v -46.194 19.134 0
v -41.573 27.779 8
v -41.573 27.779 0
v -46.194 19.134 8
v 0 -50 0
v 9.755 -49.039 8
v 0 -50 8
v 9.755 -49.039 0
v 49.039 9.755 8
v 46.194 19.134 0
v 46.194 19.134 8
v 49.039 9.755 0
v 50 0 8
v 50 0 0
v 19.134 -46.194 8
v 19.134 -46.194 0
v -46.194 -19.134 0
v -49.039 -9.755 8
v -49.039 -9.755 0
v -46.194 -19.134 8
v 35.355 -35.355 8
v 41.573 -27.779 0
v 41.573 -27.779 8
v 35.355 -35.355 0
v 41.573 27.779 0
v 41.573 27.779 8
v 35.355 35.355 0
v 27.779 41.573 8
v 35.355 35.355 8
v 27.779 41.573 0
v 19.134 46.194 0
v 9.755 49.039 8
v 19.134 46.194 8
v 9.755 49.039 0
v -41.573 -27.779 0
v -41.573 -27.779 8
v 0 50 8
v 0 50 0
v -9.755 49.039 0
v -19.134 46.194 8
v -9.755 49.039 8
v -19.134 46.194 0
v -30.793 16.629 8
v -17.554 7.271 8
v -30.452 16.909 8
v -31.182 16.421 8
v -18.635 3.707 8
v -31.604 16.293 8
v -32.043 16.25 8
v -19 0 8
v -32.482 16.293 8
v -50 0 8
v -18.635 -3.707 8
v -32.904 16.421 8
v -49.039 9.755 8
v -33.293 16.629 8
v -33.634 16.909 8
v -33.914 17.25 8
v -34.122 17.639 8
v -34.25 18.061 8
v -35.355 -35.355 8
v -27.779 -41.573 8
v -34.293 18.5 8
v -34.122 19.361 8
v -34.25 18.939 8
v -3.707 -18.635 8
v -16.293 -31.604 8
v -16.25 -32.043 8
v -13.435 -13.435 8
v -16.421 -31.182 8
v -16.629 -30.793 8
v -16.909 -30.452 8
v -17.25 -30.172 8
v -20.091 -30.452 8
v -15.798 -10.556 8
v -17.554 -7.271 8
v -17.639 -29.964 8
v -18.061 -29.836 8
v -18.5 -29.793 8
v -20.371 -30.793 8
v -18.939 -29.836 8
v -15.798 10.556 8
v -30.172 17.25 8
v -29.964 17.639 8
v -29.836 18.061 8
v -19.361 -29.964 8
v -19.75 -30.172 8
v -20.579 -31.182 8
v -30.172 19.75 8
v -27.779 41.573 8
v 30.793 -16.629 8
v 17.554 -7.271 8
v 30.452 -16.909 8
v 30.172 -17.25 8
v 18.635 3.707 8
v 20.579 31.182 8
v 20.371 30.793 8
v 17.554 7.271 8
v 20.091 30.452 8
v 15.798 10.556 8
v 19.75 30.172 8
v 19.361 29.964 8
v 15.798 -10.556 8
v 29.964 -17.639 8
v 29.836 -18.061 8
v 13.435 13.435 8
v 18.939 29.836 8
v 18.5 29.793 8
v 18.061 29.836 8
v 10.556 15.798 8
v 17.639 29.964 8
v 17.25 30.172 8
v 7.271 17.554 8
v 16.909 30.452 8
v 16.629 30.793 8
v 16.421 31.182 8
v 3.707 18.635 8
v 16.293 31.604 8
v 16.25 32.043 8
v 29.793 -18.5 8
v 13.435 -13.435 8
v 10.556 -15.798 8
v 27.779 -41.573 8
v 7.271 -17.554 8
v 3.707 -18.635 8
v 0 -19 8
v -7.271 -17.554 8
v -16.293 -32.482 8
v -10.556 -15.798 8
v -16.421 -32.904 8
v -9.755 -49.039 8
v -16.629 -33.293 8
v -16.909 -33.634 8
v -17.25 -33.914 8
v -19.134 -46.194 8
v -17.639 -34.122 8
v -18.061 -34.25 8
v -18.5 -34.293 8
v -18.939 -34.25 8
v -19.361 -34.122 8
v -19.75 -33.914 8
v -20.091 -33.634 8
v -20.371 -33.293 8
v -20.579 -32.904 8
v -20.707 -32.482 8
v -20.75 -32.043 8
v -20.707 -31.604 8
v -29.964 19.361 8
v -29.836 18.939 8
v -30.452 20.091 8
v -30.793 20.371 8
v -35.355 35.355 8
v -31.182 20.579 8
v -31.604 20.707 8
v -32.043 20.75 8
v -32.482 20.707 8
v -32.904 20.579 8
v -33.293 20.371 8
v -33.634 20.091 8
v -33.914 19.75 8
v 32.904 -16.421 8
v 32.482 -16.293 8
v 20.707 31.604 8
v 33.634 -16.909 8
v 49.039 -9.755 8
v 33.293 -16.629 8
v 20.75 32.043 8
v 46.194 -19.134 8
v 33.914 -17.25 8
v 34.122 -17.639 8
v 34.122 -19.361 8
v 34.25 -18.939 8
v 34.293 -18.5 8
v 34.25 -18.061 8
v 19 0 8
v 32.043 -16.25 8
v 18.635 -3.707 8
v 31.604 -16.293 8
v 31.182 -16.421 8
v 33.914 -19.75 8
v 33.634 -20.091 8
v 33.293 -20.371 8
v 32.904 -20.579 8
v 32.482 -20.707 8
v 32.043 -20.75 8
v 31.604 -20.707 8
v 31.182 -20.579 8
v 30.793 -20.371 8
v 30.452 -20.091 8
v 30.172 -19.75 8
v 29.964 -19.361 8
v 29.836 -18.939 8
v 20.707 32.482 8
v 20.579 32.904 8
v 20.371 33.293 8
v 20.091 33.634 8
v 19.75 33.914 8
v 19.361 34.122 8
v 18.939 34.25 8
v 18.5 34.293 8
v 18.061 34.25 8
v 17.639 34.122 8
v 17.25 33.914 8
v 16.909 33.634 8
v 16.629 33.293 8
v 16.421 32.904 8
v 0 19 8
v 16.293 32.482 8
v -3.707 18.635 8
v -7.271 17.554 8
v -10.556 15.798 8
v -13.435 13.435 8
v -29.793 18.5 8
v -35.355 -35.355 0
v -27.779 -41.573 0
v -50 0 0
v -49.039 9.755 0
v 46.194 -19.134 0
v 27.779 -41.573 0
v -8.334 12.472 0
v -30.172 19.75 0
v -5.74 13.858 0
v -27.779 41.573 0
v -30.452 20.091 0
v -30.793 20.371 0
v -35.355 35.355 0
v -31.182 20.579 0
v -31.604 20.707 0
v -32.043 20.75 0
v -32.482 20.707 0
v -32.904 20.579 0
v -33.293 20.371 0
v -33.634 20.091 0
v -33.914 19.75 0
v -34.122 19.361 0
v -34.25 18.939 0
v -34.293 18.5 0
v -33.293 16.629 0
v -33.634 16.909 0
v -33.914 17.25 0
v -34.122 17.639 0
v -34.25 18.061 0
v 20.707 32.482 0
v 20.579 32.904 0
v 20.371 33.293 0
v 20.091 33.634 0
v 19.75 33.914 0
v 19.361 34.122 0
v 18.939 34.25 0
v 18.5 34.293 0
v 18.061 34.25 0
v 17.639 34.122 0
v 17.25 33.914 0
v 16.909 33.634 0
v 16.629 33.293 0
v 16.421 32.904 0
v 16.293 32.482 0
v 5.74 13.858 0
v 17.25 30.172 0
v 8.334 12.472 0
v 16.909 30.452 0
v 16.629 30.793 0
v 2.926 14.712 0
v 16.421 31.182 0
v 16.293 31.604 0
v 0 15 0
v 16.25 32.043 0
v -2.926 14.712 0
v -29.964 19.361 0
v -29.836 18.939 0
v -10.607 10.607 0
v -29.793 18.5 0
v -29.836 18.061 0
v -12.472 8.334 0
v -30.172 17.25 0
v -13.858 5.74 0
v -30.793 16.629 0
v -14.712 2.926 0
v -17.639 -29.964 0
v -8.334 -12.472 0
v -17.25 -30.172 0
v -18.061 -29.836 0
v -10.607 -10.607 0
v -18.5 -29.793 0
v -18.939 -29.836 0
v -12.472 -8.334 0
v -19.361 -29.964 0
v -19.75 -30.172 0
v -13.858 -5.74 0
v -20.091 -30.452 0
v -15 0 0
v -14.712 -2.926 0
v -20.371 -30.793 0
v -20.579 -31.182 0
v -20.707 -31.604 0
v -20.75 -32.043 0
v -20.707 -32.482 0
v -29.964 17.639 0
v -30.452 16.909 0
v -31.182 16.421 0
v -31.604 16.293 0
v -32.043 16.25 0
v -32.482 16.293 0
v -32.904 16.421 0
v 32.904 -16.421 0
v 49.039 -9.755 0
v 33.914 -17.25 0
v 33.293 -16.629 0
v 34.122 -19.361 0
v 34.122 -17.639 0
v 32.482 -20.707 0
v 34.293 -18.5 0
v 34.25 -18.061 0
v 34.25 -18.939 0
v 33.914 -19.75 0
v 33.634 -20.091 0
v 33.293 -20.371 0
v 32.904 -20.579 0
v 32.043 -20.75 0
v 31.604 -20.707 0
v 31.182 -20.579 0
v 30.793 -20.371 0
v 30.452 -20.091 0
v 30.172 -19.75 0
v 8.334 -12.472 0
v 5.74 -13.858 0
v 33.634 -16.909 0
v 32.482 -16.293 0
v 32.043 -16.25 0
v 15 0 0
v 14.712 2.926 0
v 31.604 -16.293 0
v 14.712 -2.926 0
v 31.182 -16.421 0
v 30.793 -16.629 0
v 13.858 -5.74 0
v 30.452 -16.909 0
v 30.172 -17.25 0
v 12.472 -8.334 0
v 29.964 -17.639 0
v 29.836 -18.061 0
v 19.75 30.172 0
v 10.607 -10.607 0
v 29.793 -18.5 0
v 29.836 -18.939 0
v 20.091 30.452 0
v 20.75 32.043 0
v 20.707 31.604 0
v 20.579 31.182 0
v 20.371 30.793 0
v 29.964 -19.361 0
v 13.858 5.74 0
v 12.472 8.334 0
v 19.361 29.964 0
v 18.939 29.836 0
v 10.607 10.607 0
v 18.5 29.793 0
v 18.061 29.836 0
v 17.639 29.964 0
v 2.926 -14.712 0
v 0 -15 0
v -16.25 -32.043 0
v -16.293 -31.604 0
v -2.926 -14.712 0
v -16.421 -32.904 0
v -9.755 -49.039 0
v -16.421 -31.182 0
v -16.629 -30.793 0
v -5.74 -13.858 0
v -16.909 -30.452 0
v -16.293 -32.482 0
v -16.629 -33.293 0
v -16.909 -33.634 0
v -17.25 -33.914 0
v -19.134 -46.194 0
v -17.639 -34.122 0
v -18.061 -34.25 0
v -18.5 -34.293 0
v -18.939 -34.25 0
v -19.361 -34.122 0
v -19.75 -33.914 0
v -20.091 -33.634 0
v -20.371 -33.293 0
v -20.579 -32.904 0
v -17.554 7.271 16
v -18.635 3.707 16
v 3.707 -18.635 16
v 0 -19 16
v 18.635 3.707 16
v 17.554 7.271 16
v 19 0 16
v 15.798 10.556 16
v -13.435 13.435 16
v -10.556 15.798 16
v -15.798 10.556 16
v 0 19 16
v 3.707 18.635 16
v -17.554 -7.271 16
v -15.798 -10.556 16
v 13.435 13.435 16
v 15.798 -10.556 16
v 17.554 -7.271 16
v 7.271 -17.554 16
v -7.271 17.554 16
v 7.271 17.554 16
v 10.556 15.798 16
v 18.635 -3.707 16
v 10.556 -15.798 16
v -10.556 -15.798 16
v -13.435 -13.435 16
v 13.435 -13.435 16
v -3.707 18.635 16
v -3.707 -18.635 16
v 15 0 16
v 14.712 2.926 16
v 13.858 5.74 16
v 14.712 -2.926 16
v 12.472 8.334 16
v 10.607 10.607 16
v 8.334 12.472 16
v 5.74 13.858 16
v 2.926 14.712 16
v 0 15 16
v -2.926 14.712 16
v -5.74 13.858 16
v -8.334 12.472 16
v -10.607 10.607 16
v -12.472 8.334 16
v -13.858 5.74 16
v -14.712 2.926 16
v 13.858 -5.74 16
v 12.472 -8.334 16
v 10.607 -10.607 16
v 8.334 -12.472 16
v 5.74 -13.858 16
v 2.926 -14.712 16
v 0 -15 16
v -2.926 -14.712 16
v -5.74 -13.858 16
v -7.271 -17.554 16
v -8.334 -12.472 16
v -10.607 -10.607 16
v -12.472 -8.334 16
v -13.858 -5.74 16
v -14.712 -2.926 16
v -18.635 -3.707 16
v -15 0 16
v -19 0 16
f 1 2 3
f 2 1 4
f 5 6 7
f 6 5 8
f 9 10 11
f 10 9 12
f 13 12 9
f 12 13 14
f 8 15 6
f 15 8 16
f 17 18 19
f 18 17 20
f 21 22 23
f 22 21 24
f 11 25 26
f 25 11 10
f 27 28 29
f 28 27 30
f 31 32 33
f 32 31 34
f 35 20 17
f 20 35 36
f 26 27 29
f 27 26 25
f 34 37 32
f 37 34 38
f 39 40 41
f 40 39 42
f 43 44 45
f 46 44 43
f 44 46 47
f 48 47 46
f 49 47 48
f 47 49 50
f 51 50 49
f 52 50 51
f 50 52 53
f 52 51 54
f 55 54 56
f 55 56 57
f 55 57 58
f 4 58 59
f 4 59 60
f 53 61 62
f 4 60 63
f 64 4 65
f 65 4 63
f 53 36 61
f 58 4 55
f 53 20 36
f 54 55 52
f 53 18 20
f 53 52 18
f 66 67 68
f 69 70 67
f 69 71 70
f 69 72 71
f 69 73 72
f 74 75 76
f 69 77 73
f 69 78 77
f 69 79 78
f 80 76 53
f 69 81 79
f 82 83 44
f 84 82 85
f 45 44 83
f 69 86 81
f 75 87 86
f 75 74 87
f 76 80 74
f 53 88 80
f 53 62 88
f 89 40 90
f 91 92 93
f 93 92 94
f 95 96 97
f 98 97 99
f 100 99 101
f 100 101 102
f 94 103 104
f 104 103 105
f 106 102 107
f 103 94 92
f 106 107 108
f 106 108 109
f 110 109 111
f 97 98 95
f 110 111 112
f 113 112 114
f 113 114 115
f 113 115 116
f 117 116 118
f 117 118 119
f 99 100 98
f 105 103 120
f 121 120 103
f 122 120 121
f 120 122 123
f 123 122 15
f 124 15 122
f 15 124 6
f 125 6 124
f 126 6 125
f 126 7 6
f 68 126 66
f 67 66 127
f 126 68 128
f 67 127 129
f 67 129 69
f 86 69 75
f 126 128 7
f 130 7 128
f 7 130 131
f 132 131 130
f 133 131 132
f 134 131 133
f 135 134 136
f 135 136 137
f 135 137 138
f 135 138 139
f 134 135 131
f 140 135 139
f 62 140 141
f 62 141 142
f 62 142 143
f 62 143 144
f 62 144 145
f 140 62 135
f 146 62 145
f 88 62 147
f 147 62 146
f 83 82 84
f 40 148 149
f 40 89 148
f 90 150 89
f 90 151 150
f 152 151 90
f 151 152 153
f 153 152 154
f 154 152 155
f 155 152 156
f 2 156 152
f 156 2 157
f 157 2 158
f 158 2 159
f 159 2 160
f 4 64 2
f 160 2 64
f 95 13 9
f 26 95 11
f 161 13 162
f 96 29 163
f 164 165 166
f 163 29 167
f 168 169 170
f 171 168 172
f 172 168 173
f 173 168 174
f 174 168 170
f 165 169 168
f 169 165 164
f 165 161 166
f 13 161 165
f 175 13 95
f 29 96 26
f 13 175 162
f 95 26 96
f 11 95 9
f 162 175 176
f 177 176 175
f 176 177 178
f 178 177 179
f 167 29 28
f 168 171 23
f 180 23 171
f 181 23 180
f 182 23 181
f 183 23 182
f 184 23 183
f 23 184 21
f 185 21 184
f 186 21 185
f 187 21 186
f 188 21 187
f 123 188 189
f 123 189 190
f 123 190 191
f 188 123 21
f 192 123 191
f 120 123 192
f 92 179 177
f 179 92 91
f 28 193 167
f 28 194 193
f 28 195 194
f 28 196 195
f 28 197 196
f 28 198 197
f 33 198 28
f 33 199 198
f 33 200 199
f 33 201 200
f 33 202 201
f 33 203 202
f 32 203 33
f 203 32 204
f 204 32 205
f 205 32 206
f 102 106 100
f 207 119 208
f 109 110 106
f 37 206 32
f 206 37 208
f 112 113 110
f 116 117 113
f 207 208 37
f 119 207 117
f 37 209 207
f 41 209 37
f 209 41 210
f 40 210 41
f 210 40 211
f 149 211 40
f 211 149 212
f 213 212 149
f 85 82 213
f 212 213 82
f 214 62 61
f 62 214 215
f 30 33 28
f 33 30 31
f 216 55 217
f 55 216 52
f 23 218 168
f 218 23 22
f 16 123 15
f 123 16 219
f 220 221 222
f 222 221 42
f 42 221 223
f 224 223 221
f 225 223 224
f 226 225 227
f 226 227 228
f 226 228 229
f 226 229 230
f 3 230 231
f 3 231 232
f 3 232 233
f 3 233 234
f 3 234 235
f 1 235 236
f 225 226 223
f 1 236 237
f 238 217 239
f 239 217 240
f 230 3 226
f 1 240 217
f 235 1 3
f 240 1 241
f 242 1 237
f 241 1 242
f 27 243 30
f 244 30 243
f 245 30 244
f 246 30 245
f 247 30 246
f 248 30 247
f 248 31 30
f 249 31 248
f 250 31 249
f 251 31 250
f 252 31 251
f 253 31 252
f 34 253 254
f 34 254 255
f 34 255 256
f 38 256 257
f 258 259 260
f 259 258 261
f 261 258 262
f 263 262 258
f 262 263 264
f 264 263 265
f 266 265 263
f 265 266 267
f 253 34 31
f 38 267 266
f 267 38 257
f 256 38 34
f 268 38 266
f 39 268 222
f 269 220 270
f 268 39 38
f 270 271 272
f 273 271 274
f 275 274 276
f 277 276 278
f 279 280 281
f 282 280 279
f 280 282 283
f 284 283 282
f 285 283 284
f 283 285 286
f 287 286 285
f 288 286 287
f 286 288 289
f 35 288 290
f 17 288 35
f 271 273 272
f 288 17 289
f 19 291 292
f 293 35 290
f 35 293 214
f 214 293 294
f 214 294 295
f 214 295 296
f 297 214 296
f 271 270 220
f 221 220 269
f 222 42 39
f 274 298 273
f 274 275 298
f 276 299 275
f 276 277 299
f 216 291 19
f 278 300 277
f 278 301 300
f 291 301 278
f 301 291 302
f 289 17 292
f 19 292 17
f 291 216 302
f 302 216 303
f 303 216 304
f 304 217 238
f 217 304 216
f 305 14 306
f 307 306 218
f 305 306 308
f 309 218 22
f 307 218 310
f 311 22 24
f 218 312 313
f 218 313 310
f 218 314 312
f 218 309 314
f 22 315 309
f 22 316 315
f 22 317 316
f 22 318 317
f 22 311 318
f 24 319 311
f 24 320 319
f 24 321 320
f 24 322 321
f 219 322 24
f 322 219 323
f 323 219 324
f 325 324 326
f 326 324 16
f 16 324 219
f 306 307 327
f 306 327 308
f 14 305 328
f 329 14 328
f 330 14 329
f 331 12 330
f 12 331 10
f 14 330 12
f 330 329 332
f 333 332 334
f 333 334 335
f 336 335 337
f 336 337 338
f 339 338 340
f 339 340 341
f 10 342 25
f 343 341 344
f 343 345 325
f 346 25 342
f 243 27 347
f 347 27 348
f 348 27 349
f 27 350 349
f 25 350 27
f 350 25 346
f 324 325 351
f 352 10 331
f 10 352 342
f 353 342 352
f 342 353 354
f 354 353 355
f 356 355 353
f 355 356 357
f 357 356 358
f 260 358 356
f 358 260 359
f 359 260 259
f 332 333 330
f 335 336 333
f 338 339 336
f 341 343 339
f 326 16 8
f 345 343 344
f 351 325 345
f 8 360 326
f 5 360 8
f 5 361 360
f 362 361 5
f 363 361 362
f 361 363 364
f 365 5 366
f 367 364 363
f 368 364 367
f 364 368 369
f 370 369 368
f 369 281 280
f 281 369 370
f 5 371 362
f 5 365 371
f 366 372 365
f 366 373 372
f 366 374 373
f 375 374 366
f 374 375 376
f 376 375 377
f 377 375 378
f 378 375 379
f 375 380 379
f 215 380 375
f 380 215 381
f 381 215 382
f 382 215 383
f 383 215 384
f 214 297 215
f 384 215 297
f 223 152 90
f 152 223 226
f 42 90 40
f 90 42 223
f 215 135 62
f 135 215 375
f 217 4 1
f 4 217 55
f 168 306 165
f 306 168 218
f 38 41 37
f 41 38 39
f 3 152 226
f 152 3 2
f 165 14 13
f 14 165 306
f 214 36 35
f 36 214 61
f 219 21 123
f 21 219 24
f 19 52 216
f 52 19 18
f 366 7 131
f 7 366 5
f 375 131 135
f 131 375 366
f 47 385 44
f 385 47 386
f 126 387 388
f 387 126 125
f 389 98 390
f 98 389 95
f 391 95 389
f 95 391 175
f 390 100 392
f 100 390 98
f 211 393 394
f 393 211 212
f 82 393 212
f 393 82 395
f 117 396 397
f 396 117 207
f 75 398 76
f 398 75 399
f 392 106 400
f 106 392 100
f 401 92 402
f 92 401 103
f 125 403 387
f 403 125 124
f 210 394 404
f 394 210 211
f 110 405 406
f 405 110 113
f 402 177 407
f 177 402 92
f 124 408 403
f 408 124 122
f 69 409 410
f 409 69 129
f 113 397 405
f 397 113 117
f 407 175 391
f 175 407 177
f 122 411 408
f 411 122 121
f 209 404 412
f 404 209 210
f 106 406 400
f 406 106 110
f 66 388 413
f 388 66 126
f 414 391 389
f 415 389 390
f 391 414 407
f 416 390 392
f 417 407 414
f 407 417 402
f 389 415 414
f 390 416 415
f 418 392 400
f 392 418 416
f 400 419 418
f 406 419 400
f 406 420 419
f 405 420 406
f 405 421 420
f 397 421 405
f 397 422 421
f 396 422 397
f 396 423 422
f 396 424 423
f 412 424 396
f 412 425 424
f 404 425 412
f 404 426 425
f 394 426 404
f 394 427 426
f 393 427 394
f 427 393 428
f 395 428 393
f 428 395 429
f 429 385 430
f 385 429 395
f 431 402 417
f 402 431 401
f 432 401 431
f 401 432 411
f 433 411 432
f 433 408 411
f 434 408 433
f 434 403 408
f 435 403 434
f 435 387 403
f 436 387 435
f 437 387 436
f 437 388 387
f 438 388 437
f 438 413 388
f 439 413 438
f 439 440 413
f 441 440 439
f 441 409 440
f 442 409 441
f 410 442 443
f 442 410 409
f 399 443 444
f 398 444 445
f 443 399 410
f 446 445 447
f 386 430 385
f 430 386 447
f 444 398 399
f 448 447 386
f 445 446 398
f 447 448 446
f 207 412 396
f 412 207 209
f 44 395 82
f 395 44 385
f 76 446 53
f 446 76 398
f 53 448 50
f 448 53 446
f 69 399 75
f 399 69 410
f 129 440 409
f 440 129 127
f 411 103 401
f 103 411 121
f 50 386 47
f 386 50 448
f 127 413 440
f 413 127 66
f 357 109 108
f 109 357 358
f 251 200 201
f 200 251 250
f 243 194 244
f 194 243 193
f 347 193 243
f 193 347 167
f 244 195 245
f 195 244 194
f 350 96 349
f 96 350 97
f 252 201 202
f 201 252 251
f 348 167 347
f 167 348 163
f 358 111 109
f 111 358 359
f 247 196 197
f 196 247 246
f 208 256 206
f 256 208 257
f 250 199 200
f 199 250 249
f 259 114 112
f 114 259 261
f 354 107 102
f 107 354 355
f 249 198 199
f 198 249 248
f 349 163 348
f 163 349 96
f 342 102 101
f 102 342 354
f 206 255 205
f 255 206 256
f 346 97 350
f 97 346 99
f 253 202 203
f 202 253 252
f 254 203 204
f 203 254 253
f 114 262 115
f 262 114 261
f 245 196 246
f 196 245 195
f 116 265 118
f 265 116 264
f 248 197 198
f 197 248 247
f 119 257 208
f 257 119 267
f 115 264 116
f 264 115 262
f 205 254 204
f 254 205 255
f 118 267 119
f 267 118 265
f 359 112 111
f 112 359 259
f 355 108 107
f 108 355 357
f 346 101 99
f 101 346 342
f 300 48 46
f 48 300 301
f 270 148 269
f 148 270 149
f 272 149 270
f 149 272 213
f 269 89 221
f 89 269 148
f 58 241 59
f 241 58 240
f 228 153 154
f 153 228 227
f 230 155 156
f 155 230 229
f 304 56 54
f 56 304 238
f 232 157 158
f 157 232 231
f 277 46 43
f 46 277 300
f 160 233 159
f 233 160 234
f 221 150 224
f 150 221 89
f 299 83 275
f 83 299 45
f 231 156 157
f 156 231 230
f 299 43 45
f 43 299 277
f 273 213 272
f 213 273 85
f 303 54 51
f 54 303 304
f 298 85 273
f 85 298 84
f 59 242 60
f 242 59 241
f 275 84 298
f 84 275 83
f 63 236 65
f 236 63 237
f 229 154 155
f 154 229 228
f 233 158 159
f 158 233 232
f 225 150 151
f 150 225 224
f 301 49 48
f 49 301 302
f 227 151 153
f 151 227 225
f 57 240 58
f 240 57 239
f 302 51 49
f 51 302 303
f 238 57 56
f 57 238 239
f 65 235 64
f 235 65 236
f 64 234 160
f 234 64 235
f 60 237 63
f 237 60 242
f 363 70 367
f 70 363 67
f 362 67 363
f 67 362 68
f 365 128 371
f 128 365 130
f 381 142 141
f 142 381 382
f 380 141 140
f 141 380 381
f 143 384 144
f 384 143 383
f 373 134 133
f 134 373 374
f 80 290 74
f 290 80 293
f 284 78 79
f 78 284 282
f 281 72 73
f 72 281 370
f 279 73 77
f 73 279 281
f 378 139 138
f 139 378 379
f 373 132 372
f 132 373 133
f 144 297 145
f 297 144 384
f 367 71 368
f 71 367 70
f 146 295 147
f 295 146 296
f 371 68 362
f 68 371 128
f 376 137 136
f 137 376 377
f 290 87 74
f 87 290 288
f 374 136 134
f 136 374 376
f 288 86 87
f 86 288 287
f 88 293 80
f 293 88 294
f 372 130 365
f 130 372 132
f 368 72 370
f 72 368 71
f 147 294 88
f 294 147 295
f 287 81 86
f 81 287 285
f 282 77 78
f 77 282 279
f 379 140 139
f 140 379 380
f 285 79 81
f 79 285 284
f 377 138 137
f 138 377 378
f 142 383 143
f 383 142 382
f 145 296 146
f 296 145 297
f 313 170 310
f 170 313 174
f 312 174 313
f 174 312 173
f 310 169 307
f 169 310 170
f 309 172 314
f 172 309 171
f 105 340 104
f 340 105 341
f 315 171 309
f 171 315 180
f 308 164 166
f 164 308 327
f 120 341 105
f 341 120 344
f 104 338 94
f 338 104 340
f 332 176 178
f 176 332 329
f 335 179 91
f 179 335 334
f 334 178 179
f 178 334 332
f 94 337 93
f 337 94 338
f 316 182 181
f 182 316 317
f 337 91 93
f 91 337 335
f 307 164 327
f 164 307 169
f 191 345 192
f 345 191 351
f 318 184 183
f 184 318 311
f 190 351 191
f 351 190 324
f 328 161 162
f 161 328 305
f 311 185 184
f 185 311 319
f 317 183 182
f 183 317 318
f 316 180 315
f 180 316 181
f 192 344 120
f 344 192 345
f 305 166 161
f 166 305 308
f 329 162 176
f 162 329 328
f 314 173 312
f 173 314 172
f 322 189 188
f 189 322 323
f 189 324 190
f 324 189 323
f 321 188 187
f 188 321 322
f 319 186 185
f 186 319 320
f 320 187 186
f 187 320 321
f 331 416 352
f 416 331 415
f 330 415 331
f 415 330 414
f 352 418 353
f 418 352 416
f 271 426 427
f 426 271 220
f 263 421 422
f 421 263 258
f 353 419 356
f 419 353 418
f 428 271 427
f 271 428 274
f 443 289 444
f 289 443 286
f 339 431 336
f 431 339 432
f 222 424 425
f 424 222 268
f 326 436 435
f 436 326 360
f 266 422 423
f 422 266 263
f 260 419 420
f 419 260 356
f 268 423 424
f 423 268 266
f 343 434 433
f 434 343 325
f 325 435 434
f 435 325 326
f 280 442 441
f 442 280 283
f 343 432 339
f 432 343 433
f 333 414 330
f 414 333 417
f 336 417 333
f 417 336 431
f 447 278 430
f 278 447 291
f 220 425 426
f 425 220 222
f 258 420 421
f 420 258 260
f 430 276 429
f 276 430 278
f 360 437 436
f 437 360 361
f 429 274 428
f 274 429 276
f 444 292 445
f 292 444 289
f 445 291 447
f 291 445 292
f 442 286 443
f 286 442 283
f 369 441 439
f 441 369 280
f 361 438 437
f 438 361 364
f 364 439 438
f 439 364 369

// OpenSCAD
$fn = 32;

// ----------------------------------------------------------------------
// Flange Ø100 x 8
// 4 holes on a Ø74 bolt circle, bolted joints
// ----------------------------------------------------------------------

// --- parameters (mm) ---
flange_d = 100;  // outside diameter of the flange
thickness = 8;   // flange thickness
holes = 4;       // number of bolt holes
pcd = 74;        // bolt circle diameter
start_deg = 60;  // angle of the first hole, from +X
hole_d = 4.5;    // bolt hole diameter
bore_d = 30;     // central through bore
hub_d = 38;      // hub outside diameter
hub_h = 8;       // hub height above the flange face (0 = no hub)

// --- derived feature positions (mm) ---
height = thickness + hub_h;  // = 16   overall height of the part
pcd_r = pcd / 2;             // = 37   bolt circle radius
hole_step = 360 / holes;     // = 90   angular pitch
feature_centers = [
  [pcd_r * cos(start_deg + 0 * hole_step), pcd_r * sin(start_deg + 0 * hole_step)],
  [pcd_r * cos(start_deg + 1 * hole_step), pcd_r * sin(start_deg + 1 * hole_step)],
  [pcd_r * cos(start_deg + 2 * hole_step), pcd_r * sin(start_deg + 2 * hole_step)],
  [pcd_r * cos(start_deg + 3 * hole_step), pcd_r * sin(start_deg + 3 * hole_step)]
];   // bolt hole centres on the pitch circle

// flange disc, every hole and the bore cut straight through
difference() {
  union() {
    cylinder(d = flange_d, h = thickness);
    cylinder(d = hub_d, h = height);  // hub, overlapped into the flange
  }
  translate([0, 0, -1]) cylinder(d = bore_d, h = height + 2);  // bore, through
  for (centre = feature_centers)
    translate([centre[0], centre[1], -1]) cylinder(d = hole_d, h = thickness + 2);
}
